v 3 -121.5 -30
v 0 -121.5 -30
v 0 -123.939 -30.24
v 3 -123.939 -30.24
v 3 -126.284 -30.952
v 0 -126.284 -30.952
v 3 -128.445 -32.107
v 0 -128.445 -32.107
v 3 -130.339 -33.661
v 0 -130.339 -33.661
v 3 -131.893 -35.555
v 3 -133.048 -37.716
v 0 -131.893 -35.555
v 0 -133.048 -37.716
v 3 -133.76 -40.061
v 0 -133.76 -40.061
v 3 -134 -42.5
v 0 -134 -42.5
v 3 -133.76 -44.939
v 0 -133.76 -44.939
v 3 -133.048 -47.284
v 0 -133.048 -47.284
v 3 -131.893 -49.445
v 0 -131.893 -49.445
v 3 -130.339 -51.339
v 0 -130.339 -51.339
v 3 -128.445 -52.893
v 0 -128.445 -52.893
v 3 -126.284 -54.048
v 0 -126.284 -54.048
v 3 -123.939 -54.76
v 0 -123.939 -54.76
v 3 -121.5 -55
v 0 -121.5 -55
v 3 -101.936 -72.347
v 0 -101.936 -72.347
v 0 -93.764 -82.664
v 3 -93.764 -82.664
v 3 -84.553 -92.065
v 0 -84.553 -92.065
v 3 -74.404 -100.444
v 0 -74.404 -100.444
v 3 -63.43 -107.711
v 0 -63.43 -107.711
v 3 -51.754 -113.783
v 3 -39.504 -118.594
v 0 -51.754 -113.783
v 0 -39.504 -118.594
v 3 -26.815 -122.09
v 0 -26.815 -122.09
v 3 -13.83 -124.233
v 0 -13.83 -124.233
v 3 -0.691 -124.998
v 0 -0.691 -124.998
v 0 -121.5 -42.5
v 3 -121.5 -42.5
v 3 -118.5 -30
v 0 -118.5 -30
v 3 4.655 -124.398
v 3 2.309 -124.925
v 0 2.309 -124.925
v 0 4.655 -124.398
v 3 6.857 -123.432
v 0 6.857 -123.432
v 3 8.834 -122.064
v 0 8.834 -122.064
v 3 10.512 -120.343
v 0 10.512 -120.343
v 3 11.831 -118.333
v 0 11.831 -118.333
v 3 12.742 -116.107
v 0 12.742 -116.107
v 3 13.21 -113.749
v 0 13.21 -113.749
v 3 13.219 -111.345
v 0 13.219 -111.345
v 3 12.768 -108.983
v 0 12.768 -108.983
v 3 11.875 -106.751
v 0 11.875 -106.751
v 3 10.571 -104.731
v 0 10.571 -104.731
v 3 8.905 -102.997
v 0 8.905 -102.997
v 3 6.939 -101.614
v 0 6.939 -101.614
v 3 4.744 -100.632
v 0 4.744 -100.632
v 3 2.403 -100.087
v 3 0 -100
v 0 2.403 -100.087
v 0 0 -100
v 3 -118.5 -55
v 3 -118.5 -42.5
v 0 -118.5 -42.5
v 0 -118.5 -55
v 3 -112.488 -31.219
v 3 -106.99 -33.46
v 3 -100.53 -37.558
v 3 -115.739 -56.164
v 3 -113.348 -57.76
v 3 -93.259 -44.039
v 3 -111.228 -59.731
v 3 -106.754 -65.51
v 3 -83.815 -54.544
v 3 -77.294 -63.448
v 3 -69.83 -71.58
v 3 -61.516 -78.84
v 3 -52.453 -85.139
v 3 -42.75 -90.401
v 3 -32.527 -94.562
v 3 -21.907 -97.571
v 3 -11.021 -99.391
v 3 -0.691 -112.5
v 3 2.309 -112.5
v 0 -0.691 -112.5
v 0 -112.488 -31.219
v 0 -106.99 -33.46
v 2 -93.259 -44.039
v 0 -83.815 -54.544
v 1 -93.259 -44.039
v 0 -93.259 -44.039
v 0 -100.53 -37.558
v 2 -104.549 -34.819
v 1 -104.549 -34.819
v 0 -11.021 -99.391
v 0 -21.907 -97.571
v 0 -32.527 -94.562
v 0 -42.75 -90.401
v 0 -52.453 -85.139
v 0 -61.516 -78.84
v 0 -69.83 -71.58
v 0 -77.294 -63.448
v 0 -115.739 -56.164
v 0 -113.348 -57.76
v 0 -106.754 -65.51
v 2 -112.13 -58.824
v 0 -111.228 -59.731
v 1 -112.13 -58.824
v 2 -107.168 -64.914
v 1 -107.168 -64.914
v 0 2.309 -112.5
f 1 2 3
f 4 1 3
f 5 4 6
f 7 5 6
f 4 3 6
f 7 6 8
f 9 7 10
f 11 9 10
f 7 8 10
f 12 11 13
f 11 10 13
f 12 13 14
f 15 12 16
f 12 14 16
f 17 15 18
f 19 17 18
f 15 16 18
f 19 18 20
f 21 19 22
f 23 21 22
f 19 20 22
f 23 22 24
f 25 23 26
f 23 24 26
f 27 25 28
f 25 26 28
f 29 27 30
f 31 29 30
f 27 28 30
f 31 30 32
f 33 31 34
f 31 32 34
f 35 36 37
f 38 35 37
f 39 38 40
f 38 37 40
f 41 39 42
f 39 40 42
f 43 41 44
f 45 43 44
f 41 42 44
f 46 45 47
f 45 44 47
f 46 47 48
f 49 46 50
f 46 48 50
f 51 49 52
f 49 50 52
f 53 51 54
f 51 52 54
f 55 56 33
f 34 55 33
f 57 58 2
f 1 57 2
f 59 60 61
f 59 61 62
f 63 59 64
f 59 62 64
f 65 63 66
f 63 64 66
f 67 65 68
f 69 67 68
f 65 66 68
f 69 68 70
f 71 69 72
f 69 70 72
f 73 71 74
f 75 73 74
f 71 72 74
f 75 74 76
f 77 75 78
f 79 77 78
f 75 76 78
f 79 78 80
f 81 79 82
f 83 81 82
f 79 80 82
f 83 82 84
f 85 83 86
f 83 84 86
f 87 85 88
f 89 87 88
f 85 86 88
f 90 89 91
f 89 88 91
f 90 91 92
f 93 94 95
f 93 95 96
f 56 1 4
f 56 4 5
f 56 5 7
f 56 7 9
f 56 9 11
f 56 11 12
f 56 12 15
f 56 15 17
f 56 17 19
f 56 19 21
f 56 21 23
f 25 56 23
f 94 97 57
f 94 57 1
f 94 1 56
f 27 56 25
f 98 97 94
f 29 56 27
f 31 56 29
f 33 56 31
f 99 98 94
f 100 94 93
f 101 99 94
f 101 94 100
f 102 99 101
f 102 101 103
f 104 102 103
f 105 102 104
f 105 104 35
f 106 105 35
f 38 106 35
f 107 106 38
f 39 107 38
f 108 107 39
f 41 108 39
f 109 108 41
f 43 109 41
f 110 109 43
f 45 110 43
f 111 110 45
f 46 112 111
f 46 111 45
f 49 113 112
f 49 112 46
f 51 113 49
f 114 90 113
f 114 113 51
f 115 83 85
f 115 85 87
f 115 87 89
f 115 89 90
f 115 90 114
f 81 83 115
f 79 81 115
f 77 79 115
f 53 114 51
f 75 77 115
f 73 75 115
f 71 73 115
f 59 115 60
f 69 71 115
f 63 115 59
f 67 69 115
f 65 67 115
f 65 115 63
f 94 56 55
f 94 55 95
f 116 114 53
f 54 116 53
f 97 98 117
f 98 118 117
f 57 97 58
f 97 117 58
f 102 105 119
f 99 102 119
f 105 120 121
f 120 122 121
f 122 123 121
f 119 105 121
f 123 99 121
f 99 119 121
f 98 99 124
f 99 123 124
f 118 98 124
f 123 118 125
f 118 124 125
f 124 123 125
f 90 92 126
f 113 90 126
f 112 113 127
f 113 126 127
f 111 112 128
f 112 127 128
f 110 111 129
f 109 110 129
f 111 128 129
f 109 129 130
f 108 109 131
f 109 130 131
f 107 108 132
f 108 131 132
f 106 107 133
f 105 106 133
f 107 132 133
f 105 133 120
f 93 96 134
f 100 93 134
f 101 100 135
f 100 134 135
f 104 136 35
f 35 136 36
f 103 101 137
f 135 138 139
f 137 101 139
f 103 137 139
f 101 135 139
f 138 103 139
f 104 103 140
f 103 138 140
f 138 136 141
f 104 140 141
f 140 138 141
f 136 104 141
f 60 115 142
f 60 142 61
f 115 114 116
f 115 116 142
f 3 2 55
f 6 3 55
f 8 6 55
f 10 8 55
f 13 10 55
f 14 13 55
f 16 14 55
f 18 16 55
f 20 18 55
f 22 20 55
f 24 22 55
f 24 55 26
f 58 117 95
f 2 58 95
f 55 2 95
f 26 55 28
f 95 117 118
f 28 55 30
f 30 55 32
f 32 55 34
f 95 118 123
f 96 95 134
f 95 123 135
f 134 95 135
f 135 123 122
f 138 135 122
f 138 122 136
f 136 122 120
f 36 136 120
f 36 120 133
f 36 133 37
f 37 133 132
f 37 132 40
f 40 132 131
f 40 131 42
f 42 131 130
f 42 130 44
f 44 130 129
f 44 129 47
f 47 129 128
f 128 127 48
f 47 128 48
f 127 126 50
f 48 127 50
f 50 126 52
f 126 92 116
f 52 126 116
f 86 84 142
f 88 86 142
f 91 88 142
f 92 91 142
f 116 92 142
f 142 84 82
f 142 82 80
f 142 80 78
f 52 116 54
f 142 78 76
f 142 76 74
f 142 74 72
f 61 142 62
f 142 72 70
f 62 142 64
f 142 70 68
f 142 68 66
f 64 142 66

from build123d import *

# Parameters (mm, degrees)
BOSS_EXTRUDE2_DEPTH = 3
SKETCH2_W           = 12.5
SKETCH2_H           = 3
CUT_EXTRUDE1_DEPTH  = 3


with BuildPart() as part:
    # Sketch1 → Boss-Extrude2 (new body)
    with BuildSketch(Plane(origin=(0, 0, 0), x_dir=(0, 0, -1), z_dir=(1, 0, 0))):
        with BuildLine():
            Line((125, 0), (125, 1.5))
            ThreePointArc((125, 1.5), (111.75, 13.25), (100, 0))
            ThreePointArc((100, 0), (87.904372108, -47.674116292), (54.543572715, -83.81526517))
            add(Edge.make_bspline(
                [(54.543572715, -83.81526517), (44.434436781, -92.608940988), (31.581333534, -102.945692353), (30, -118.5)],
                knots=[0, 0, 0, 0, 1, 1, 1, 1], degree=3))
            Line((30, -118.5), (30, -121.5))
            ThreePointArc((30, -121.5), (42.5, -134), (55, -121.5))
            Line((55, -121.5), (55, -118.5))
            add(Edge.make_bspline(
                [(55, -118.5), (57.384287812, -110.868607185), (64.548856078, -107.860641761), (72.347282186, -101.935620665)],
                knots=[0, 0, 0, 0, 1, 1, 1, 1], degree=3))
            ThreePointArc((72.347282186, -101.935620665), (111.059466668, -57.365450084), (125, 0))
        make_face()
    extrude(amount=BOSS_EXTRUDE2_DEPTH)

    # Sketch2 → Cut-Extrude1 (cut)
    with BuildSketch(Plane(origin=(3, 0, 0), x_dir=(0, 0, -1), z_dir=(1, 0, 0))):
        with Locations((118.75, 0.8091646)):
            Rectangle(SKETCH2_W, SKETCH2_H)
        with Locations((48.75, -120)):
            Rectangle(SKETCH2_W, SKETCH2_H)
    extrude(amount=-CUT_EXTRUDE1_DEPTH, mode=Mode.SUBTRACT)


solid = part.part
